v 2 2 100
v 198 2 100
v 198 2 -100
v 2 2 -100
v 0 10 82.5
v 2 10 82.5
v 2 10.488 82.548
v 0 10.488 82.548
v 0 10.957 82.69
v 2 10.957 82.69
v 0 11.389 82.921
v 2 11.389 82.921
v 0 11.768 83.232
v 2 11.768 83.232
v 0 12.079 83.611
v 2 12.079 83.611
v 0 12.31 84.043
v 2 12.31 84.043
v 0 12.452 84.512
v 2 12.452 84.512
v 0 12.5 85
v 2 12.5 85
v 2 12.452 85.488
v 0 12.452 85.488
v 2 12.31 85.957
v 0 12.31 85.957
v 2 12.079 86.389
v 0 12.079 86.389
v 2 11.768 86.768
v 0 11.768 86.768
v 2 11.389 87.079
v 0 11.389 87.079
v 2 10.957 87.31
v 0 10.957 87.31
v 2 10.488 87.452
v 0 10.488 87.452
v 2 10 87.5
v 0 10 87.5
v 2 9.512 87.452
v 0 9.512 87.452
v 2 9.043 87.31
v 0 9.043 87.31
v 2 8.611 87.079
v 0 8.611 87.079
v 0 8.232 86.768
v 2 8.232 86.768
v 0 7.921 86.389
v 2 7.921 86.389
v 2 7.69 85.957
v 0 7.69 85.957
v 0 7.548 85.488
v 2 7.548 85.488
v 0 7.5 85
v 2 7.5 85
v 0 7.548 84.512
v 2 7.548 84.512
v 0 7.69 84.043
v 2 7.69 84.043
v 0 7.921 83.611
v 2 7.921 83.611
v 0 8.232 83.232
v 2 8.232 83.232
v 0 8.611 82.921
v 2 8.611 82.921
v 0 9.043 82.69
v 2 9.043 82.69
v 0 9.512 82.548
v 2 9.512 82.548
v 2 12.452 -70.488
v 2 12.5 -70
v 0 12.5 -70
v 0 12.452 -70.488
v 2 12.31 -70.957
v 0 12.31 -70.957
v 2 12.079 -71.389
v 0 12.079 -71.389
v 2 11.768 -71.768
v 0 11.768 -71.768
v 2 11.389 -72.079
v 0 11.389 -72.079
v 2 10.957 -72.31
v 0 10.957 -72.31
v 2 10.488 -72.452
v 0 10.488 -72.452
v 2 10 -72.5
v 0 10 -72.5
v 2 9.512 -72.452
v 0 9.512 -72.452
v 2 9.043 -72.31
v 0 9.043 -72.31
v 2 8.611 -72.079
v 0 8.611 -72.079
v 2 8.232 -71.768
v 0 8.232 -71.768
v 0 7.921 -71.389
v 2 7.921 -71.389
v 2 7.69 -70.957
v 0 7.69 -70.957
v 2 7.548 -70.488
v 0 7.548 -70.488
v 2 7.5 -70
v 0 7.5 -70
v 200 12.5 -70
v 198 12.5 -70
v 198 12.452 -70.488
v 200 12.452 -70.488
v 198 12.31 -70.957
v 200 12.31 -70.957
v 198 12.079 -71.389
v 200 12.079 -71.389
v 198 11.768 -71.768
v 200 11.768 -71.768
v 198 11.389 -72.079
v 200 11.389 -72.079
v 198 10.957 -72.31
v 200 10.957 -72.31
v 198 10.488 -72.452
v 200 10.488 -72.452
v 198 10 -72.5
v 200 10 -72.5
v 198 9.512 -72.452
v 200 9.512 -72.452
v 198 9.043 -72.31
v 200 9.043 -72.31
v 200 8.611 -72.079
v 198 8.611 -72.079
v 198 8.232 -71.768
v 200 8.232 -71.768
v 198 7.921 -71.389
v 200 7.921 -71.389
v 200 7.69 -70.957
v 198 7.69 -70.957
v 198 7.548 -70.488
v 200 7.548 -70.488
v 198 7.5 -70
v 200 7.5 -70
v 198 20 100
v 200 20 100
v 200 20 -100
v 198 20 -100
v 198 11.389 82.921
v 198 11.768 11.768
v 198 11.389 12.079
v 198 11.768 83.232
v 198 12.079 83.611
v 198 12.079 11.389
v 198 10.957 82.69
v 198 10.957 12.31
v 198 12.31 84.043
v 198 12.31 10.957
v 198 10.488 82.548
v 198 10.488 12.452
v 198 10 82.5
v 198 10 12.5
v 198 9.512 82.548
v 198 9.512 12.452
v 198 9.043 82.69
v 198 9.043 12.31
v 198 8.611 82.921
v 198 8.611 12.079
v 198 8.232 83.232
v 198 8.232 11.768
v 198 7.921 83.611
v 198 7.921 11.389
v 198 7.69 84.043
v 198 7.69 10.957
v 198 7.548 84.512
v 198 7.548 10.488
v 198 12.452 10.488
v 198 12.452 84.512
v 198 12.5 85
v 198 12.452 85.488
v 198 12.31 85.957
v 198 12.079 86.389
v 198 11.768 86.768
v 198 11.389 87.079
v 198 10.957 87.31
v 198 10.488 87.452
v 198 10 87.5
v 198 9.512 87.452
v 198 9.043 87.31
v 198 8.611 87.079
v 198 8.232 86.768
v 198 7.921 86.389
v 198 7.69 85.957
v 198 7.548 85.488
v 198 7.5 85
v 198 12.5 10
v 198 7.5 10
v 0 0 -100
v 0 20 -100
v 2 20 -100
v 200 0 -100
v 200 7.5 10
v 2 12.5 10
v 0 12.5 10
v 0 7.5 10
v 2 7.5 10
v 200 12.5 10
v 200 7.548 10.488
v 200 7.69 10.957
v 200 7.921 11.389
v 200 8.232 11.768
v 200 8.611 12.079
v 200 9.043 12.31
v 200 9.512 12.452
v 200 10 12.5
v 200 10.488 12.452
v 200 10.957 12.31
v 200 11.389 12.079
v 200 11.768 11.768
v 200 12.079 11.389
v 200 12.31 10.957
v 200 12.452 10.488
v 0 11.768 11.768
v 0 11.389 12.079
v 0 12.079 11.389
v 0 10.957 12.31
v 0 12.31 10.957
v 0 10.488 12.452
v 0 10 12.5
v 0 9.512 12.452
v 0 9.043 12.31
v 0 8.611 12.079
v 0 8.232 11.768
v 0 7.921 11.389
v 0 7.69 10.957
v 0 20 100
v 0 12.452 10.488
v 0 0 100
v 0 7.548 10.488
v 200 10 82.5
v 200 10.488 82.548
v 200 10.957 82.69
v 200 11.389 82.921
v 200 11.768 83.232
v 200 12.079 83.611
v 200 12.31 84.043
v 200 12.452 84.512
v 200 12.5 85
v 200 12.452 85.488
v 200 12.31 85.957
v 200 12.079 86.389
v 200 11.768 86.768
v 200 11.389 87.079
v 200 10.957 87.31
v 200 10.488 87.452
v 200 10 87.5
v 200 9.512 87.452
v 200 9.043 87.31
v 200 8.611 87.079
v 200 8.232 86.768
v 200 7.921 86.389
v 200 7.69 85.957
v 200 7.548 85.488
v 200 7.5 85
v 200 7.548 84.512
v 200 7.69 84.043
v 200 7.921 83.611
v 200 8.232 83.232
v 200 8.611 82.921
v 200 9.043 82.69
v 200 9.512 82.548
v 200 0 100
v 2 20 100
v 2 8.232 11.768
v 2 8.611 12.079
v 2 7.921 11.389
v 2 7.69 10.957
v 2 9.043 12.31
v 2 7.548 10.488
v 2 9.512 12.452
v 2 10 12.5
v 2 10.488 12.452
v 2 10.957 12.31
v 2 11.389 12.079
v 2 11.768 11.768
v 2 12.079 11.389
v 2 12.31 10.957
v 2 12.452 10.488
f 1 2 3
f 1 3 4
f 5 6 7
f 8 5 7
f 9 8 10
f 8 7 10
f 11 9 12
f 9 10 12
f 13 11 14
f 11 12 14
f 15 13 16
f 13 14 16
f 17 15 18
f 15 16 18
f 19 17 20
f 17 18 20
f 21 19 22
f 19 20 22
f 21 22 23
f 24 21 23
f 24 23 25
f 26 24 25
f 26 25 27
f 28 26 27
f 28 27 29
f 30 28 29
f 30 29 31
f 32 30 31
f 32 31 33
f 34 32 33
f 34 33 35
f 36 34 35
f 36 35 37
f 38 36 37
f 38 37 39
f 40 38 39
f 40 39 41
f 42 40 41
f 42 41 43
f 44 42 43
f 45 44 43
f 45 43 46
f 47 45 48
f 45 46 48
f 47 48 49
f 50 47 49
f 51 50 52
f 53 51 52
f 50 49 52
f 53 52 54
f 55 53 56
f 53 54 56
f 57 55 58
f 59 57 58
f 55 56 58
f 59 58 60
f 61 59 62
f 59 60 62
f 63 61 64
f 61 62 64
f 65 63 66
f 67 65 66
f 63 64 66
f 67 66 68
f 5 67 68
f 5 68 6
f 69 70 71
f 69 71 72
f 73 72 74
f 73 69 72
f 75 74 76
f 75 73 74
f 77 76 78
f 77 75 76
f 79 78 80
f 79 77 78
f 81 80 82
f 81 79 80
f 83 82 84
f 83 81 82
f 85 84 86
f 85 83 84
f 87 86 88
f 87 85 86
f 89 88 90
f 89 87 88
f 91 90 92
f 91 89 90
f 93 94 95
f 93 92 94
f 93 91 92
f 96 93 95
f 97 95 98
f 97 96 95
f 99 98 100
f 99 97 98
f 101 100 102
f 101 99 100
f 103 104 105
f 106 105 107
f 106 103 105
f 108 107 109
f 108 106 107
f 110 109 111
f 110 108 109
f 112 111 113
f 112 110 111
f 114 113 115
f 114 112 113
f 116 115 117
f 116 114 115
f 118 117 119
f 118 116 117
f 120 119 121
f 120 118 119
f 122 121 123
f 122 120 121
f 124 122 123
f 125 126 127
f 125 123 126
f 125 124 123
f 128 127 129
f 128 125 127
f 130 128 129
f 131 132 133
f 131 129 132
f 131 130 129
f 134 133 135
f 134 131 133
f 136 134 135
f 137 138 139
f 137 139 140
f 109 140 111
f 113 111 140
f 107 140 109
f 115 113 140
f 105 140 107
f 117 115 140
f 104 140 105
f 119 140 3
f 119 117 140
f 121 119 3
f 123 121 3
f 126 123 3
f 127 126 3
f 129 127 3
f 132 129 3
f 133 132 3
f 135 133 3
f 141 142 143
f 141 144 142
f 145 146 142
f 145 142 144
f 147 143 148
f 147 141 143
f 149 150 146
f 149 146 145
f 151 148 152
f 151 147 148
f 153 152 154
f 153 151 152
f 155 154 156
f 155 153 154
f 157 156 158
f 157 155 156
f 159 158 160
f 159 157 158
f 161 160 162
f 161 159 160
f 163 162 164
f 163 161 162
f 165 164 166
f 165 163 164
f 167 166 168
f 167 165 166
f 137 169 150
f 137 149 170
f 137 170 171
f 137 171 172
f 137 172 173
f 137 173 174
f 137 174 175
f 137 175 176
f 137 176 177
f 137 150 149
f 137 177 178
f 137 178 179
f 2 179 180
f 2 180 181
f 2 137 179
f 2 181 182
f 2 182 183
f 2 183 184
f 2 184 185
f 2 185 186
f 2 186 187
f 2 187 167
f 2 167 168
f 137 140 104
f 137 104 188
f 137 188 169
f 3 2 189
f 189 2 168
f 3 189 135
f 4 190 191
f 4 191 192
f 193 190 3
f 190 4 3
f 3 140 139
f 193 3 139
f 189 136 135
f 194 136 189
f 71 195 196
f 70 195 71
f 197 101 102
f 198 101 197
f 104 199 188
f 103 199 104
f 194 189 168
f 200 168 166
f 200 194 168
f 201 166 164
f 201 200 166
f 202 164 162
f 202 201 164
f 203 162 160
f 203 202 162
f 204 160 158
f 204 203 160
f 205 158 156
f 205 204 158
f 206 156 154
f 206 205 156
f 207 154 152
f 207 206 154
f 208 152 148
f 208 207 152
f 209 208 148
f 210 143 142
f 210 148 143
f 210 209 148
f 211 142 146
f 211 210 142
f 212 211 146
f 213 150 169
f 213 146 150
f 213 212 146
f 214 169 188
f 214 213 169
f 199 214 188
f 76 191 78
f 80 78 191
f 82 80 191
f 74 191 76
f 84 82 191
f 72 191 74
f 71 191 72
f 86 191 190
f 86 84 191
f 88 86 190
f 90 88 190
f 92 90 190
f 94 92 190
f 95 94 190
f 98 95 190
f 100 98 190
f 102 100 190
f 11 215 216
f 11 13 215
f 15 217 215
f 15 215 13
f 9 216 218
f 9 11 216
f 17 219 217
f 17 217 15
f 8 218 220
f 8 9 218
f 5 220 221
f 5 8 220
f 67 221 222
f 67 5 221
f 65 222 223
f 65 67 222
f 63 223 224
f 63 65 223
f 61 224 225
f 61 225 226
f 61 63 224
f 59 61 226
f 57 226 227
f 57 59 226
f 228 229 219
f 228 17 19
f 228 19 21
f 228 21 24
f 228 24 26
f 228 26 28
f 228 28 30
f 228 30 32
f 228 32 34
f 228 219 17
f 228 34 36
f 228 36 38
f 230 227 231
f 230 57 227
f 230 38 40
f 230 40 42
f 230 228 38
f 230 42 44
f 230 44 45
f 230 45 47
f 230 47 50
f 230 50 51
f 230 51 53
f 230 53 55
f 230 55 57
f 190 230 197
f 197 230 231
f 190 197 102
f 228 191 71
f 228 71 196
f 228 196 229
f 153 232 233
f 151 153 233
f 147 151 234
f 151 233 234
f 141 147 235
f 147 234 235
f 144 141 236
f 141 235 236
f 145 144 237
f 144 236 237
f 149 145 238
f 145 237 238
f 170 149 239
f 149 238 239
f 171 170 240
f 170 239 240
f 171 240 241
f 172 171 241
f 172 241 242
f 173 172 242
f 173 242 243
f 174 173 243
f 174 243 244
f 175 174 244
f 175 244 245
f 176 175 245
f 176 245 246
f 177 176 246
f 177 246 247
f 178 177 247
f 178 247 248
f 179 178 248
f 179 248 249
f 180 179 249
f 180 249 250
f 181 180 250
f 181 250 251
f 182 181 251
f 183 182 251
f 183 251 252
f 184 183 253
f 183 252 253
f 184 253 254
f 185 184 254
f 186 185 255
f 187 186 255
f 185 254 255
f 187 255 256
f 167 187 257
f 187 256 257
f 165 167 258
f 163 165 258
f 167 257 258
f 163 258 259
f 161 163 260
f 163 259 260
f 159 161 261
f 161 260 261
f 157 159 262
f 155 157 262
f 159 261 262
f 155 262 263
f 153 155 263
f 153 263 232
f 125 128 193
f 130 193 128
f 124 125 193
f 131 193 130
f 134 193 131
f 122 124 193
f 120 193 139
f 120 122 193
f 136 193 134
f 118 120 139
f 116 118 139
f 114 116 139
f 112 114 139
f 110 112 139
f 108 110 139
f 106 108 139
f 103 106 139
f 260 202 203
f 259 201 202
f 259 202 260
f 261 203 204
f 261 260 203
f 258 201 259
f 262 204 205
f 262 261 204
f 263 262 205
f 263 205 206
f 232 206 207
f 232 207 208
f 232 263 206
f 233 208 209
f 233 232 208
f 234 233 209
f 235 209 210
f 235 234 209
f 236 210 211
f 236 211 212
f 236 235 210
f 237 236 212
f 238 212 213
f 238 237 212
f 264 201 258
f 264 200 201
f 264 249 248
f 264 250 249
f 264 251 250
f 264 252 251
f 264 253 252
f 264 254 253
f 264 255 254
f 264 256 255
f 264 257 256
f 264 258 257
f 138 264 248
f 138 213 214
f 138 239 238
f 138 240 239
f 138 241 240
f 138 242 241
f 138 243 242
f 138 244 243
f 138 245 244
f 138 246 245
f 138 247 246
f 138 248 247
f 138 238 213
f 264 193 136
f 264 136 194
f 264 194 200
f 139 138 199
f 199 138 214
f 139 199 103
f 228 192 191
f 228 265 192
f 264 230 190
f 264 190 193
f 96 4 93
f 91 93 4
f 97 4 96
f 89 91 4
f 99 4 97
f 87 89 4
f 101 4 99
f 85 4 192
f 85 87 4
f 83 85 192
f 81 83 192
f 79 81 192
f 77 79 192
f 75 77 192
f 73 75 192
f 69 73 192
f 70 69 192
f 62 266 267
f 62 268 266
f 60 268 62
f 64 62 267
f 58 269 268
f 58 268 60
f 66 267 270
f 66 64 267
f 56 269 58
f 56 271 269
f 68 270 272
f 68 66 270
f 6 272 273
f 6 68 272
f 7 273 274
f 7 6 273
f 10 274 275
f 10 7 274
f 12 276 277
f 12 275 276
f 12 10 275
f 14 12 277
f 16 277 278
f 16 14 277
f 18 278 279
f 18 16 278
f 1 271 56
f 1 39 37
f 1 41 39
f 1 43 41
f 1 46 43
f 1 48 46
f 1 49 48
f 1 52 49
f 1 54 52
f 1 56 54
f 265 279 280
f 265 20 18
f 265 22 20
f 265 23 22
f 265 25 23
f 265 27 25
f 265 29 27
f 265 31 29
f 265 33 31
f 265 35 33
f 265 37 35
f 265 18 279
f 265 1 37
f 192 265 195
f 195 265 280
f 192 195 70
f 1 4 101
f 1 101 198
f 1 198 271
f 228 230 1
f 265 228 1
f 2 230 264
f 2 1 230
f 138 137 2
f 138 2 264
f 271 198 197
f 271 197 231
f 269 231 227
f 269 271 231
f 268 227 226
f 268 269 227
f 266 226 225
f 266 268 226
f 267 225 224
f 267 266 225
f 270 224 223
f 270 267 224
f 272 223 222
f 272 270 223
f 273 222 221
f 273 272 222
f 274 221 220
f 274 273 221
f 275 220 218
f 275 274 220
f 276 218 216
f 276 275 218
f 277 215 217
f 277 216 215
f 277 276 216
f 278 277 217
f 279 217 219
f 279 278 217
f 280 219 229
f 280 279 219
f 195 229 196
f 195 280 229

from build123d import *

# Parameters (mm, degrees)
BOSS_EXTRUDE1_DEPTH = 100
SKETCH2_R           = 2.5
CUT_EXTRUDE1_DEPTH  = 225.499443206


with BuildPart() as part:
    # Sketch1 → Boss-Extrude1 (new, symmetric)
    with BuildSketch(Plane.XY):
        Polygon((0, 20), (0, 0), (200, 0), (200, 20), (198, 20), (198, 2), (2, 2), (2, 20), align=None)
    extrude(amount=BOSS_EXTRUDE1_DEPTH, both=True)

    # Sketch2 → Cut-Extrude1 (cut, through all)
    with BuildSketch(Plane(origin=(200, 0, 0), x_dir=(0, 0, -1), z_dir=(1, 0, 0))):
        with Locations((-85, 10)):
            Circle(SKETCH2_R)
        with BuildLine():
            Line((70, 7.5), (-10, 7.5))
            ThreePointArc((-10, 7.5), (-12.5, 10), (-10, 12.5))
            Line((-10, 12.5), (70, 12.5))
            ThreePointArc((70, 12.5), (72.5, 10), (70, 7.5))
        make_face()
    extrude(amount=-CUT_EXTRUDE1_DEPTH, mode=Mode.SUBTRACT)


solid = part.part
